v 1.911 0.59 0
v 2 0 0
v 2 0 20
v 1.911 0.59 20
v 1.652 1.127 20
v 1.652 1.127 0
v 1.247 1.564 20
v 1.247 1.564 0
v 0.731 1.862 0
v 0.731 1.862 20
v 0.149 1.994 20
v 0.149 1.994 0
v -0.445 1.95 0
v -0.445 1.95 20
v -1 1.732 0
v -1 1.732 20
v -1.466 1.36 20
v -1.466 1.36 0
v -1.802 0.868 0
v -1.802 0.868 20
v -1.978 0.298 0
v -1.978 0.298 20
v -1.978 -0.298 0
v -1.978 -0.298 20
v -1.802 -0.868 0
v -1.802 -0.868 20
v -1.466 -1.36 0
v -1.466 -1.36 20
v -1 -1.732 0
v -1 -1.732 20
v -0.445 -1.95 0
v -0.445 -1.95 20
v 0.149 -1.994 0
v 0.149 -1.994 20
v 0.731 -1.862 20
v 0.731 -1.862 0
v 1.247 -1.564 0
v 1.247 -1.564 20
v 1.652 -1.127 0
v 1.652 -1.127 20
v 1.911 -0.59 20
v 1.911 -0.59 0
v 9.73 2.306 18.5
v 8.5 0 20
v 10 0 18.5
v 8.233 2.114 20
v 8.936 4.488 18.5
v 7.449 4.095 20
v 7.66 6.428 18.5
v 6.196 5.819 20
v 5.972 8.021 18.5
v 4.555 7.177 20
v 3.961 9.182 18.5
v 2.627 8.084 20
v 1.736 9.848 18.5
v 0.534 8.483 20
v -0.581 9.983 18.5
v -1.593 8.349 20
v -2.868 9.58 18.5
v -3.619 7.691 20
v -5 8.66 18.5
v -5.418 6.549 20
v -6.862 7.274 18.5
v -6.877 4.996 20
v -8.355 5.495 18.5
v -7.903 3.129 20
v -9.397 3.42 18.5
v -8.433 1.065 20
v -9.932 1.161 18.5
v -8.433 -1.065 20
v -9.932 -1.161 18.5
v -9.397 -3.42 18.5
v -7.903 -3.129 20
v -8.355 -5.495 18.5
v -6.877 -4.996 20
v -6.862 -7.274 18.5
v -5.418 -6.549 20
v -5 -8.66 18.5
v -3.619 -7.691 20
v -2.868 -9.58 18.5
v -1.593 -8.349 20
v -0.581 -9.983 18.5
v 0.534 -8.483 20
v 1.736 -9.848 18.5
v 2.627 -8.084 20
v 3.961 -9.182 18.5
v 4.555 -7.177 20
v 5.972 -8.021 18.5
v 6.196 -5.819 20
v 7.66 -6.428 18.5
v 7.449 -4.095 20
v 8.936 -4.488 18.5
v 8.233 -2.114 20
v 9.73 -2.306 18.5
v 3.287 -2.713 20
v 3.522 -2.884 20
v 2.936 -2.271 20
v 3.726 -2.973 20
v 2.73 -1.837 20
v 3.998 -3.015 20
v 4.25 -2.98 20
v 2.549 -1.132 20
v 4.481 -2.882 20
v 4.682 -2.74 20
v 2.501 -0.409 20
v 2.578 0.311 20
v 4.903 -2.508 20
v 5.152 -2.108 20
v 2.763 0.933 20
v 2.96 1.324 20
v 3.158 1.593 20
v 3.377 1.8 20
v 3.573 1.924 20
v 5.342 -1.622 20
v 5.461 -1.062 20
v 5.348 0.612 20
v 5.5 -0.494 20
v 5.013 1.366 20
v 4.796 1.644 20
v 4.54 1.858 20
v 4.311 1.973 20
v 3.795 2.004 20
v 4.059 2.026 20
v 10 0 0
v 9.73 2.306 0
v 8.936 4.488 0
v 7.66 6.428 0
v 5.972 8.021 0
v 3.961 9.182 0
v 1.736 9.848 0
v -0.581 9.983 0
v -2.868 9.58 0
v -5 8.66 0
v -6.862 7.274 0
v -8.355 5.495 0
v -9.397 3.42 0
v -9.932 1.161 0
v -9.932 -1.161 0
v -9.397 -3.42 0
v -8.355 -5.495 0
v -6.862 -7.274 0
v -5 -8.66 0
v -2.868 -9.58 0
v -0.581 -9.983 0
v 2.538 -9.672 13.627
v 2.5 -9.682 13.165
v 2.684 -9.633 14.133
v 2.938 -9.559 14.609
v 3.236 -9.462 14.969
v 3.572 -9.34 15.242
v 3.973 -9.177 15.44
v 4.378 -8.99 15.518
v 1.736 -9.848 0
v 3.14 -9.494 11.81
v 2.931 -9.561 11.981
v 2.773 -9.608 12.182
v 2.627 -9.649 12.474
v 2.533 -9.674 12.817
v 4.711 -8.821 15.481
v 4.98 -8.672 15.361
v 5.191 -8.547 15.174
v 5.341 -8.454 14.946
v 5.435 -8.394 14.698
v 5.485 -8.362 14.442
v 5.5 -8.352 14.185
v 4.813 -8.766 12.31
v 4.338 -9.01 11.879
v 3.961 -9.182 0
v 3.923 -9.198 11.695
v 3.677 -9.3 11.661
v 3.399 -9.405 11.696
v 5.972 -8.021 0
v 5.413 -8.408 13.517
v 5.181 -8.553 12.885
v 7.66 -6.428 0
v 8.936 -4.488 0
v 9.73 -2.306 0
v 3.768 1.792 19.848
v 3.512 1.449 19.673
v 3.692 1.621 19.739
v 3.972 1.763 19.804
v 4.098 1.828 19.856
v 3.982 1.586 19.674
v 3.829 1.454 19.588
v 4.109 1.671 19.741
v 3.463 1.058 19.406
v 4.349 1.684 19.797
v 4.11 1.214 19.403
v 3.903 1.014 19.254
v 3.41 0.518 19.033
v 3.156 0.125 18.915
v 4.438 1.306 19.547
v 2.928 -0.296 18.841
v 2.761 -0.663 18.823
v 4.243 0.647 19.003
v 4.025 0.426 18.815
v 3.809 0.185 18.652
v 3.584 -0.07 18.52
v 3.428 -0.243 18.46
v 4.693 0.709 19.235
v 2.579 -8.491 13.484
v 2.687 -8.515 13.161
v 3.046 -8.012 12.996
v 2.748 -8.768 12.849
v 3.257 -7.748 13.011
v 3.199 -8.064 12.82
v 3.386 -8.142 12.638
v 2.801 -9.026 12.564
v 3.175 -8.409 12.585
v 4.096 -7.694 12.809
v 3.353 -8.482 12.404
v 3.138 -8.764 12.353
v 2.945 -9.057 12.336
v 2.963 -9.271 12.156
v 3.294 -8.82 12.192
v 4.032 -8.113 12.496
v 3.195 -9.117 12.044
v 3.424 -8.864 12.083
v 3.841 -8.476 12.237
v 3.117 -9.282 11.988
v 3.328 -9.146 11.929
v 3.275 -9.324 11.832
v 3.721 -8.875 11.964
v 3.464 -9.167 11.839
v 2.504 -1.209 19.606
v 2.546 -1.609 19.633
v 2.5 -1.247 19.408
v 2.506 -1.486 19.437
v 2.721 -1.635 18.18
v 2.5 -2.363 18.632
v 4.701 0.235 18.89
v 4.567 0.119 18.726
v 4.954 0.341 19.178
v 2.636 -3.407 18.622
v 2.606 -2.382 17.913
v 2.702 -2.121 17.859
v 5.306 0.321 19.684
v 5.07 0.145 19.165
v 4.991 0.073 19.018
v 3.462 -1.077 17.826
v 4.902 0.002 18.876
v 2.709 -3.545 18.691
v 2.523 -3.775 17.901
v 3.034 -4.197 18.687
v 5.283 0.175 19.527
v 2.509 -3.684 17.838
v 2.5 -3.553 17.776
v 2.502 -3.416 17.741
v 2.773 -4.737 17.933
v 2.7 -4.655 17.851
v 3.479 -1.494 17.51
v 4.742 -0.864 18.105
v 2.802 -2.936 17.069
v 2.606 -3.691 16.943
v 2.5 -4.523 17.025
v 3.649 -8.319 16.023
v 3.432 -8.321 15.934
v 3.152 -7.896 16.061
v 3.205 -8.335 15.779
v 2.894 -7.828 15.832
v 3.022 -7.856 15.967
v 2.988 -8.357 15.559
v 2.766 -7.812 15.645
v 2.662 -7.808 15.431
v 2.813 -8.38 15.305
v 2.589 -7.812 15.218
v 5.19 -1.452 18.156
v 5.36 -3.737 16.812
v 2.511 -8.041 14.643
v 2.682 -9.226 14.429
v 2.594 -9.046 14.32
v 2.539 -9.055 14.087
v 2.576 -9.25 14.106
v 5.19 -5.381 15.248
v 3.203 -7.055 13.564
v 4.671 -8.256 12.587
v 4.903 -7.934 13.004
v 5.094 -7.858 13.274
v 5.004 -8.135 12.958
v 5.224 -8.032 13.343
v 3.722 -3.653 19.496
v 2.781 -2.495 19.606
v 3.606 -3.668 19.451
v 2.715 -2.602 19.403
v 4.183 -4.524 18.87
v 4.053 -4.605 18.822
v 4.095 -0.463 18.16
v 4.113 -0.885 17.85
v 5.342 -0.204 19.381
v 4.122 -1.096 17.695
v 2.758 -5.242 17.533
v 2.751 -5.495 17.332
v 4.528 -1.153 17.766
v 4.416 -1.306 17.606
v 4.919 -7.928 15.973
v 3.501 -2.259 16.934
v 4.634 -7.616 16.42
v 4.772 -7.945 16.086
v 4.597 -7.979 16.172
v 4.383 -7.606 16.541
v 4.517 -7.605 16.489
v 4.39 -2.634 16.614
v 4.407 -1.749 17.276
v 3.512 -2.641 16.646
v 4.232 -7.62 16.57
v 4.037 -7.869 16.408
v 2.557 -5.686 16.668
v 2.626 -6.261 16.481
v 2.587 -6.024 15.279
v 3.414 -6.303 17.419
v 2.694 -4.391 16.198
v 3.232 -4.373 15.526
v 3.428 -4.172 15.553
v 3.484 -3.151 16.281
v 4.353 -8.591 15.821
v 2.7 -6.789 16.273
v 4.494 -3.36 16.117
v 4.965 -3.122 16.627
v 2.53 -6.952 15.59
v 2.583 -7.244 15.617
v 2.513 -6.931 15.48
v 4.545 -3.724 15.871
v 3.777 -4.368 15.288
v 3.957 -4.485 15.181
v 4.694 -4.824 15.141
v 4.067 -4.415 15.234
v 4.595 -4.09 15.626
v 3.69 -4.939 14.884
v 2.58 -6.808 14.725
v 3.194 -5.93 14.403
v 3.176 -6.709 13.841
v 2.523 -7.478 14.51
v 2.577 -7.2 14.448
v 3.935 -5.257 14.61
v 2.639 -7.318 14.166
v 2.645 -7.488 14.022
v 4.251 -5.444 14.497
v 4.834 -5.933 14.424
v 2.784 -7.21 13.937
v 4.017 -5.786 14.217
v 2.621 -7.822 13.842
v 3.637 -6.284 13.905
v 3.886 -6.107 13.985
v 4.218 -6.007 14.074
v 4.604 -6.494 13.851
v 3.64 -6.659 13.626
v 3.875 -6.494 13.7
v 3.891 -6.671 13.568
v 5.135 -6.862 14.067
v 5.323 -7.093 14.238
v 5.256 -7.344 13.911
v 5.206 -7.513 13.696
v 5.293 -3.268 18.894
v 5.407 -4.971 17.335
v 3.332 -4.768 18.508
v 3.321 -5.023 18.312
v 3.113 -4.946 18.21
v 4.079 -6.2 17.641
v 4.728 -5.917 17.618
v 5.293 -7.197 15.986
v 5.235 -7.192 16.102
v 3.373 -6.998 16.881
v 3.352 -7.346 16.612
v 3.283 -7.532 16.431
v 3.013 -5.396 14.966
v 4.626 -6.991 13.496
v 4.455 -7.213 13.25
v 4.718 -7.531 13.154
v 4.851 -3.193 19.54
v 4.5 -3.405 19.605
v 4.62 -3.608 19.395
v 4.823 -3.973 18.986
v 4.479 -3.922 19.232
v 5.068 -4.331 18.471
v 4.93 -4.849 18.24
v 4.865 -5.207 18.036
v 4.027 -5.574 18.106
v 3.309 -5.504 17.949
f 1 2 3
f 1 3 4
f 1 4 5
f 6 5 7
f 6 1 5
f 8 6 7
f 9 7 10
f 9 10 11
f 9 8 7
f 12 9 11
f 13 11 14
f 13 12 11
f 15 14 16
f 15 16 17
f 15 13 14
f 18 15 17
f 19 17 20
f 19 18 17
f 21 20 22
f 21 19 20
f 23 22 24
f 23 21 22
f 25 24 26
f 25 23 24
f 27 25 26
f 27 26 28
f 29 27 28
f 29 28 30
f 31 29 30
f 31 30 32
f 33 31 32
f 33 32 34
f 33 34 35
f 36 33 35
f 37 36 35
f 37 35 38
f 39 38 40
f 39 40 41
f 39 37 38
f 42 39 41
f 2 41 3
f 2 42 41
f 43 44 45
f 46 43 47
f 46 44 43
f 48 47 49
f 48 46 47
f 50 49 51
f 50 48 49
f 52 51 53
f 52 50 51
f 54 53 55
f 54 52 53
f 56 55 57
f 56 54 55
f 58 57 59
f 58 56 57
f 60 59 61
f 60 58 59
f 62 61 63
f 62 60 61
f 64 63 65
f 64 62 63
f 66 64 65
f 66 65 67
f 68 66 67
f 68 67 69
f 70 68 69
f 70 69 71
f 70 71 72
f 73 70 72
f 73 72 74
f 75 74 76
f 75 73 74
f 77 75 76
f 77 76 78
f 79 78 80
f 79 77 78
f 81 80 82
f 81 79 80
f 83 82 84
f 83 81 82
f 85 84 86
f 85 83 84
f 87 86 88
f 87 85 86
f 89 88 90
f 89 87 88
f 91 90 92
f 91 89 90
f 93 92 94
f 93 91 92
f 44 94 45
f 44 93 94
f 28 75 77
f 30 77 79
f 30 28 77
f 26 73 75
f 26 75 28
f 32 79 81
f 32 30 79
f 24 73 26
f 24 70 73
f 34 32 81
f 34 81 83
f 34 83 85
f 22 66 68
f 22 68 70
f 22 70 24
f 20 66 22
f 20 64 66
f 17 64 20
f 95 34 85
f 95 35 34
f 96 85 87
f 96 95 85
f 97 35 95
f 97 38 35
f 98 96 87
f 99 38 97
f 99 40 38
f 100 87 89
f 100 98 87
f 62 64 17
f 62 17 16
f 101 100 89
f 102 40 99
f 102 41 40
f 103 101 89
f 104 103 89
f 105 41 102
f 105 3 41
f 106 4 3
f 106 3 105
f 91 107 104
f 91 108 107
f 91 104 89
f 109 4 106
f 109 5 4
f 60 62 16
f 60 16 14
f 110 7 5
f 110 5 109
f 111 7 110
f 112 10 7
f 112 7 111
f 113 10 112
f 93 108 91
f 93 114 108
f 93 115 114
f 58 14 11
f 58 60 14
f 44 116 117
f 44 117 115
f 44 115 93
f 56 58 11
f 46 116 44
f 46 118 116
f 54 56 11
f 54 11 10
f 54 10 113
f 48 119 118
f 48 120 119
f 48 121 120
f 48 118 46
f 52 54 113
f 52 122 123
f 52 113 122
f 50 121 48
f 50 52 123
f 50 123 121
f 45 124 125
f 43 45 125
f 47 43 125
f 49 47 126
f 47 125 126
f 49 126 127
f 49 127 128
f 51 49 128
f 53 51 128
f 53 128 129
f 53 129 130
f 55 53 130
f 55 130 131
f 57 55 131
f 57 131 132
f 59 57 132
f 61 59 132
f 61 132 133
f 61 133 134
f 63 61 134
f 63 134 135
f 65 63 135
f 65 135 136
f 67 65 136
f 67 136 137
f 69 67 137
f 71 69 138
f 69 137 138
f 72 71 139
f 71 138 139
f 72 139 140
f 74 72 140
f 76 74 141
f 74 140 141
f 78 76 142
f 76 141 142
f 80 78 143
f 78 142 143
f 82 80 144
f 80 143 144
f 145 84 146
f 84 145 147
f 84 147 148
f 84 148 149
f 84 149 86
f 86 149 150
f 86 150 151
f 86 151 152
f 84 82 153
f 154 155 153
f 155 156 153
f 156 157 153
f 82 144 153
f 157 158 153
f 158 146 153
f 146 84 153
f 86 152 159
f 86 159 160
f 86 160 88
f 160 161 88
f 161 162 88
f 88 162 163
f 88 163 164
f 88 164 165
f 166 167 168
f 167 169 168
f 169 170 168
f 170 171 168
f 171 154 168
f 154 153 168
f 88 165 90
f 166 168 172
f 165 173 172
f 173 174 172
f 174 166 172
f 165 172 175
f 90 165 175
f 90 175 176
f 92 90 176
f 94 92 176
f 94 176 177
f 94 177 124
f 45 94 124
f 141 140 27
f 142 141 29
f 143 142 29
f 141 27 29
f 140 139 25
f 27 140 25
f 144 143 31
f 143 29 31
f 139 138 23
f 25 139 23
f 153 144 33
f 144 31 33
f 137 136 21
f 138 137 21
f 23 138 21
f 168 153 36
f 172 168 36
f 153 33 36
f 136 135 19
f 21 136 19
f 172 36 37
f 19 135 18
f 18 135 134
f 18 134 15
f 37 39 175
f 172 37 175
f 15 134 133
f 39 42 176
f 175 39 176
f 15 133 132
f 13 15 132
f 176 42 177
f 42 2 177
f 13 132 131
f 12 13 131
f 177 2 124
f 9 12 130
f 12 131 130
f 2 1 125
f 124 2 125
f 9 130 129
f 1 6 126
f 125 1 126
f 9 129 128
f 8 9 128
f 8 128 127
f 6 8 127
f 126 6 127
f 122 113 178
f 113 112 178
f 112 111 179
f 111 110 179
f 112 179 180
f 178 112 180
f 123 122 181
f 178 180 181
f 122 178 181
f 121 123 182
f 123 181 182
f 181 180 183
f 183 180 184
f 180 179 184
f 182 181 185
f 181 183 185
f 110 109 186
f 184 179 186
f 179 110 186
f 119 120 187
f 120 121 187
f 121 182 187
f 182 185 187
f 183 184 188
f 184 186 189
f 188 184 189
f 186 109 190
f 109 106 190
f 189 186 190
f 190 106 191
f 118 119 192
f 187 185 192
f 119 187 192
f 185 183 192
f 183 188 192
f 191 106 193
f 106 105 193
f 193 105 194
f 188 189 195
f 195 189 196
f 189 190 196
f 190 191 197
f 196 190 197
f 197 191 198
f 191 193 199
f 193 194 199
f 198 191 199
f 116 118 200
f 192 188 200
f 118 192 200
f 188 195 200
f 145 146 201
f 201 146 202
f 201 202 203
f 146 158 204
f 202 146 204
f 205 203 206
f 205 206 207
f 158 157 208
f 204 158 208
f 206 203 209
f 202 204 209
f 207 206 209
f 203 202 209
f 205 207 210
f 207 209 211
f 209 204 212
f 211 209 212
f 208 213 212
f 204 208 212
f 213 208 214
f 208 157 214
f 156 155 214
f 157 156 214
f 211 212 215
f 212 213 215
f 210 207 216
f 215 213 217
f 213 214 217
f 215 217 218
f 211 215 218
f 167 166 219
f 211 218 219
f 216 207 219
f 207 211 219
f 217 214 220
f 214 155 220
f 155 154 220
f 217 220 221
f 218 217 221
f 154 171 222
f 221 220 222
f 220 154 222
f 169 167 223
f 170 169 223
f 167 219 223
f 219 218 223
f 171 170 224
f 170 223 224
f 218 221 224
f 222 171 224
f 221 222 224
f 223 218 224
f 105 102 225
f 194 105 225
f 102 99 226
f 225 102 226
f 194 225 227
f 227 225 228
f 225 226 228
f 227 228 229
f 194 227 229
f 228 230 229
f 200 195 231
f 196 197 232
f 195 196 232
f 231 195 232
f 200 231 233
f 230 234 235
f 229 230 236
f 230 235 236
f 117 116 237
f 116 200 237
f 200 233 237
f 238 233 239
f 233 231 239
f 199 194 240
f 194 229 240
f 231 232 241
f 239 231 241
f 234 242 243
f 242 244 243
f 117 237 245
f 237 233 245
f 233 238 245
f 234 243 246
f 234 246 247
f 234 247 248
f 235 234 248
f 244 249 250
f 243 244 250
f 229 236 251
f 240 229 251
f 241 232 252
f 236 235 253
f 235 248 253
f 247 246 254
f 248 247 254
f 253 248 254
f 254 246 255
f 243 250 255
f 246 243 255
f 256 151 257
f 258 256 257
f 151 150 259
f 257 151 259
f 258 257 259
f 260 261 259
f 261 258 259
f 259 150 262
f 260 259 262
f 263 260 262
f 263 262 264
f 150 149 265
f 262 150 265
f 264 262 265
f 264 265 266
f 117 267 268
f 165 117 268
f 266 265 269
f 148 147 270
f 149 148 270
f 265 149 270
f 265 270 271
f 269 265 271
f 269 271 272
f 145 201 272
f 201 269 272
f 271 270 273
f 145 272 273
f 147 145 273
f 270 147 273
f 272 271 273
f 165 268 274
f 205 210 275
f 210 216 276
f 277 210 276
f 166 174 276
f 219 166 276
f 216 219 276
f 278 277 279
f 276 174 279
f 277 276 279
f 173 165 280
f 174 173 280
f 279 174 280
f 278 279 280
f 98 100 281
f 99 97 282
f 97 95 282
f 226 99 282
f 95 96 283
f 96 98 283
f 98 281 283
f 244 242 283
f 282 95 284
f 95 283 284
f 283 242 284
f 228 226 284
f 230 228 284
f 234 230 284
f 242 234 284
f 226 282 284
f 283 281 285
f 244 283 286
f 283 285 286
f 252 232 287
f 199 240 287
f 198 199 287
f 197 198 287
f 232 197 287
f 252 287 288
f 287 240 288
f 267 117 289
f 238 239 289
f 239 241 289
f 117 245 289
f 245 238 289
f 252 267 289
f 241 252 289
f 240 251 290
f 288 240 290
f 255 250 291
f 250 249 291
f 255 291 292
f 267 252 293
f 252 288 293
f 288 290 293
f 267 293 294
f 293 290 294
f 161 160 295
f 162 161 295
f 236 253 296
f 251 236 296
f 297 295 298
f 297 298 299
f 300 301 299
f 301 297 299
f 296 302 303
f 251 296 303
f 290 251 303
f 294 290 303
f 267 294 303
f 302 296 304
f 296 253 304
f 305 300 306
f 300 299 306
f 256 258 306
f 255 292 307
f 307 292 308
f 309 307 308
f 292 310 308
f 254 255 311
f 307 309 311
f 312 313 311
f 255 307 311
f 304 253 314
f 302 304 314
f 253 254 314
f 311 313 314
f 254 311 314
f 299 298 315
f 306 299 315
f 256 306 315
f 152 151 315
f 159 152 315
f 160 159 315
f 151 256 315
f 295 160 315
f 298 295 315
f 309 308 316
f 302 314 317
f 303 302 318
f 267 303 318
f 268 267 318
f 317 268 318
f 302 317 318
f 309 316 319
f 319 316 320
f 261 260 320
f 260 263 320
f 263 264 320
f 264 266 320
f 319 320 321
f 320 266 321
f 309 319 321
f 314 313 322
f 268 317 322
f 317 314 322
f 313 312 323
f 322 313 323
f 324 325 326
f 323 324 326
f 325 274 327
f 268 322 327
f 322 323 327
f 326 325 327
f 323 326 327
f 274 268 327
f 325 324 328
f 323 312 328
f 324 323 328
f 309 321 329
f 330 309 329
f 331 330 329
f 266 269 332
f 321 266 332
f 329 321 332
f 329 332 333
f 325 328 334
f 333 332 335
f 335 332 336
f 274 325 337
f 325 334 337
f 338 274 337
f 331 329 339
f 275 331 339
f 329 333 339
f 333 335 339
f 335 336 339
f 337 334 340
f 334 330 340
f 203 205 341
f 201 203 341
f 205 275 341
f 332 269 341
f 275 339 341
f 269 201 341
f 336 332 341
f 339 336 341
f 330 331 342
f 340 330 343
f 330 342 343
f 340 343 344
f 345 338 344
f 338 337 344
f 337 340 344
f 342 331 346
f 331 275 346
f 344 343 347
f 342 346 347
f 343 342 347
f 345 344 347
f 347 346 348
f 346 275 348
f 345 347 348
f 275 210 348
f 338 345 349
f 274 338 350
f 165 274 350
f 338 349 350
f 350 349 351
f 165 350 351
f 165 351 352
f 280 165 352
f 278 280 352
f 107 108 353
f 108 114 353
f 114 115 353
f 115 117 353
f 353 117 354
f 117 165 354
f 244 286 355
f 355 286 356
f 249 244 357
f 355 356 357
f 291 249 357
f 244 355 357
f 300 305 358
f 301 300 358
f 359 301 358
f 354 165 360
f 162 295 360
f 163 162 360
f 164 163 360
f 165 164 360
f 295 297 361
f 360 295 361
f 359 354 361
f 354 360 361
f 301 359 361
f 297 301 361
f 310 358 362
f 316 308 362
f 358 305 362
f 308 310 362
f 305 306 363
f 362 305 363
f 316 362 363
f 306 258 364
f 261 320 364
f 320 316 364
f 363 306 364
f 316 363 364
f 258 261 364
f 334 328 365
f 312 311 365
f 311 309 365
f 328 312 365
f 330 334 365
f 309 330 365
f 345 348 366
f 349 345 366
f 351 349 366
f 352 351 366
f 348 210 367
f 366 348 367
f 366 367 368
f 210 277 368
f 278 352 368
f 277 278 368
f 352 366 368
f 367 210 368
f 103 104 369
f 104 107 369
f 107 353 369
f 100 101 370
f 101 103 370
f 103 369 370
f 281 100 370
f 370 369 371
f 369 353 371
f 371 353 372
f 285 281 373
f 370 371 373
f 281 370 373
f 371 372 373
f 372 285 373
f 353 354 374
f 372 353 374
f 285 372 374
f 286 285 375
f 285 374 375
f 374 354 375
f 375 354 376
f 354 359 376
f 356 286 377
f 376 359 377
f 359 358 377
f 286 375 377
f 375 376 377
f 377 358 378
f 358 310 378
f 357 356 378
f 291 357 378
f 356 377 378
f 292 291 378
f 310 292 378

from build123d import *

# Parameters (mm, degrees)
F0_R     = 10
F0_R_2   = 2
F1_DEPTH = 20
F5_R     = 1.5
F7_SIZE  = 1.5


with BuildPart() as f1:
    # F0 (on Top) → F1 (new body)
    with BuildSketch(Plane.XY):
        Circle(F0_R)
        Circle(F0_R_2, mode=Mode.SUBTRACT)
    extrude(amount=F1_DEPTH)

    # F6: sweep along a path in F3
    with BuildLine(Plane.YZ.offset(4)) as f6_path:
        Line((3.480567, 22.941271), (-17.466422, 7.439554))
    # F5 (on face) → F6 (sweep, cut)
    with BuildSketch(Plane(origin=(0, 13.2187, 9.782434), x_dir=(1, 0, 0), z_dir=(0, -0.803825, -0.594866))):
        with Locations((4, 16.370284)):
            Circle(F5_R)
    sweep(path=f6_path.line, mode=Mode.SUBTRACT)

    # F7
    f7_edges = [f1.edges().sort_by_distance(p)[0] for p in [
        (-10, 0, 20),
    ]]
    chamfer(f7_edges, length=F7_SIZE)


solid = f1.part
